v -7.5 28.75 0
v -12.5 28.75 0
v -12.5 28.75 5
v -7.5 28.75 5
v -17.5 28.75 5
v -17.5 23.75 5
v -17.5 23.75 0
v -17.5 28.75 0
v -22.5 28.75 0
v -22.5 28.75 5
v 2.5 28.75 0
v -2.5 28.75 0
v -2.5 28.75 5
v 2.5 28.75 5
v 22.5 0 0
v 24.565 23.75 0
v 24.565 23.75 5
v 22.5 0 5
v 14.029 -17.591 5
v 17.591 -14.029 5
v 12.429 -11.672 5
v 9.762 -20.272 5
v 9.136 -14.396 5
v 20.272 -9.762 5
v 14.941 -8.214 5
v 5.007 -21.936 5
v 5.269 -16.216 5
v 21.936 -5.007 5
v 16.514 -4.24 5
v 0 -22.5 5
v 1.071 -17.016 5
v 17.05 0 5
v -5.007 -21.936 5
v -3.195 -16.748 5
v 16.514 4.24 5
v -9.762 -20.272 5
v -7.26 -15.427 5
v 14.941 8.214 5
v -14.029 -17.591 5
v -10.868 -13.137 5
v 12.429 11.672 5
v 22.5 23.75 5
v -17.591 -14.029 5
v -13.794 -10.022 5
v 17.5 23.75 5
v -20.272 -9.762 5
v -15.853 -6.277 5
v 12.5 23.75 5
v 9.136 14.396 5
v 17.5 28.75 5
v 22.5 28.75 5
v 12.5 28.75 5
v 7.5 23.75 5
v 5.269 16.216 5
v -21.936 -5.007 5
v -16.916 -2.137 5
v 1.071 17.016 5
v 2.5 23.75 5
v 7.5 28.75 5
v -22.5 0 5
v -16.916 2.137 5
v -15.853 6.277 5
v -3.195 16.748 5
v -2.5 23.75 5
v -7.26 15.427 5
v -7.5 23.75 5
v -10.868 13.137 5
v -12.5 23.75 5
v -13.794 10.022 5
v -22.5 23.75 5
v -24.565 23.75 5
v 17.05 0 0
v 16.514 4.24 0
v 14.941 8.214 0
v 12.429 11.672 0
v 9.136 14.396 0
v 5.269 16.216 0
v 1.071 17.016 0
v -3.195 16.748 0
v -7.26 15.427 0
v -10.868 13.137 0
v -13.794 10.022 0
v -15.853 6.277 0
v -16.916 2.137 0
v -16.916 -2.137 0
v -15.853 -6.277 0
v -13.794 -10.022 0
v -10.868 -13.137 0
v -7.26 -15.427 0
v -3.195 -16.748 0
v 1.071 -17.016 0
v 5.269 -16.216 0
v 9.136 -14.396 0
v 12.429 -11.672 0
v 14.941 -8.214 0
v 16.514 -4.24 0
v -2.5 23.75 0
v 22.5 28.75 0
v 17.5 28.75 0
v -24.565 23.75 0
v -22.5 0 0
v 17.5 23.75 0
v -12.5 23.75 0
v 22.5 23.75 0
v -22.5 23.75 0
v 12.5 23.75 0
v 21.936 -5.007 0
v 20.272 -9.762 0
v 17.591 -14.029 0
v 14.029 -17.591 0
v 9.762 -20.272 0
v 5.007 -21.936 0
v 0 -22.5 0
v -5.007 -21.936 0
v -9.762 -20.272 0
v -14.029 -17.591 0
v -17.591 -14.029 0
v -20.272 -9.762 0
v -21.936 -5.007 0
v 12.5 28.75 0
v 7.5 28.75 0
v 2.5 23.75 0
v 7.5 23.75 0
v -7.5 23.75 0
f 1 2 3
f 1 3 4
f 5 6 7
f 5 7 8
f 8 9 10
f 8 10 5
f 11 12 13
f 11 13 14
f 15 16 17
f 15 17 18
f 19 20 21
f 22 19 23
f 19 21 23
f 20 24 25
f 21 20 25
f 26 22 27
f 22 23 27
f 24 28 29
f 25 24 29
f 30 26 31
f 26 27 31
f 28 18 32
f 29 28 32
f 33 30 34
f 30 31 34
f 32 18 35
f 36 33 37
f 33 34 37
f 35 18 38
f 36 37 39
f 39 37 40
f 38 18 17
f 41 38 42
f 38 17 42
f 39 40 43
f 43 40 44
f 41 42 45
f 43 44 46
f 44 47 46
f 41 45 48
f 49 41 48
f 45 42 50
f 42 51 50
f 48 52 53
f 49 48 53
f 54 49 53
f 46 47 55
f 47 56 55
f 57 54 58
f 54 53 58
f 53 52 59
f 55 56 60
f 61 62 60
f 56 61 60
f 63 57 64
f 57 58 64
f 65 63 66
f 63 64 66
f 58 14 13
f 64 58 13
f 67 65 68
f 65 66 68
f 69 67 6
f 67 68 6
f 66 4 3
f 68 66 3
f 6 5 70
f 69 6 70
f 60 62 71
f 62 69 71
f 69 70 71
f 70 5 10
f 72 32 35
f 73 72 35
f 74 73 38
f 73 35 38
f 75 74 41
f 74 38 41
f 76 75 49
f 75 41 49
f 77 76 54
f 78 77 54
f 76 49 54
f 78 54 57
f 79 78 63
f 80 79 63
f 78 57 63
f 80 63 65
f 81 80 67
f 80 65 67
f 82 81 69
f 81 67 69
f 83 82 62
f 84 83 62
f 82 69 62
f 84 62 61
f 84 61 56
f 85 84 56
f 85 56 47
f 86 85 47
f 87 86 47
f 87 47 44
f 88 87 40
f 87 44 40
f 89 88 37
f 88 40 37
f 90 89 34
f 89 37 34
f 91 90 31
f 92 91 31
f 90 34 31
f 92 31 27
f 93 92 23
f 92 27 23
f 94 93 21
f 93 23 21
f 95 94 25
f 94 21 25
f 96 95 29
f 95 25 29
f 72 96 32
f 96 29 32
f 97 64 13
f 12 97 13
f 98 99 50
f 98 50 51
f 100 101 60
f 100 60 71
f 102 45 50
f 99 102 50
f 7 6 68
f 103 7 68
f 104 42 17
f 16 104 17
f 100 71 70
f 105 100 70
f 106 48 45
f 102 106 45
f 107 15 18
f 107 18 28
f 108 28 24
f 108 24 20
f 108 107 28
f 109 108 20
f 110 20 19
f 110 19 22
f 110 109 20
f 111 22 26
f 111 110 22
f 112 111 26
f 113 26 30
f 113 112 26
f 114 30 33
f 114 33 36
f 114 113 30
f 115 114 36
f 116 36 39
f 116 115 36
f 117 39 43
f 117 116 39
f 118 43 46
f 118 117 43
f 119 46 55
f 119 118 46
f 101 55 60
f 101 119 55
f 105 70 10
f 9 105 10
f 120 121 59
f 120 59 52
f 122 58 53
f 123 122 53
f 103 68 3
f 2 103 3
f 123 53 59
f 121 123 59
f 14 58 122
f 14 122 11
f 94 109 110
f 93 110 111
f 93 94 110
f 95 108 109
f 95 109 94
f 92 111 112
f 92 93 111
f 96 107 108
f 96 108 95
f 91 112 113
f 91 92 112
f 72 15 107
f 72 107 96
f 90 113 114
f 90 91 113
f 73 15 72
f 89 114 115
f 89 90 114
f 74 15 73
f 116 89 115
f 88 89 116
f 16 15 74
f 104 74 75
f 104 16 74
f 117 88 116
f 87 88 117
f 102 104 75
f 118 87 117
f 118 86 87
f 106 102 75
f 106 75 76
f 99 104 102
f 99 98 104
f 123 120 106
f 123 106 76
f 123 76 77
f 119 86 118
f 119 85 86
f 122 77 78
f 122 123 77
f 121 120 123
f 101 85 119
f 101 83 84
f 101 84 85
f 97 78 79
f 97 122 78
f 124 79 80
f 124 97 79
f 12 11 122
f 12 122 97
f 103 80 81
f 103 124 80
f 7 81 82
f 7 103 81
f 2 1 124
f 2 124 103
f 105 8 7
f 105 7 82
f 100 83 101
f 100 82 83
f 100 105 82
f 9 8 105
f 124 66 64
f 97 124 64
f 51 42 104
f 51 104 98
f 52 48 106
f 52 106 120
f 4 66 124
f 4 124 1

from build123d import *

# Parameters (mm, degrees)
BOSS_EXTRU_12_DEPTH        = 5
ESQUISSE4_R                = 17.05
ENL_V_MAT_EXTRU_1_DEPTH    = 5
ESQUISSE5_W                = 5
ESQUISSE5_H                = 5
ENL_V_MAT_EXTRU_2_DEPTH    = 10
R_P_TITION_LIN_AIRE1_COUNT = 4
R_P_TITION_LIN_AIRE1_PITCH = 10
ESQUISSE6_W                = 13.329947017
ESQUISSE6_H                = 14.257676648
ESQUISSE6_W_2              = 10.080555657
ESQUISSE6_H_2              = 33.311834117
ENL_V_MAT_EXTRU_3_DEPTH    = 10


with BuildPart() as part:
    # Esquisse3 → Boss.-Extru.12 (new body)
    with BuildSketch(Plane.XY):
        with BuildLine():
            Line((-22.5, 0), (-25, 28.75))
            Line((-25, 28.75), (25, 28.75))
            Line((25, 28.75), (22.5, 0))
            ThreePointArc((22.5, 0), (0, -22.5), (-22.5, 0))
        make_face()
    extrude(amount=BOSS_EXTRU_12_DEPTH)

    # Esquisse4 → Enlèv. mat.-Extru.1 (cut)
    with BuildSketch(Plane.XY.offset(5)):
        Circle(ESQUISSE4_R)
    extrude(amount=-ENL_V_MAT_EXTRU_1_DEPTH, mode=Mode.SUBTRACT)

    # Esquisse5 → Enlèv. mat.-Extru.2 (cut)
    with BuildSketch(Plane.XY.offset(5)):
        with Locations((-15, 26.25)):
            Rectangle(ESQUISSE5_W, ESQUISSE5_H)
    enl_v_mat_extru_2 = extrude(amount=-ENL_V_MAT_EXTRU_2_DEPTH, mode=Mode.SUBTRACT)

    # Répétition linéaire1: Enlèv. mat.-Extru.2 ×4
    with Locations(*[(i * R_P_TITION_LIN_AIRE1_PITCH, 0, 0) for i in range(1, R_P_TITION_LIN_AIRE1_COUNT)]):
        add(enl_v_mat_extru_2, mode=Mode.SUBTRACT)

    # Esquisse6 → Enlèv. mat.-Extru.3 (cut)
    with BuildSketch(Plane.XY.offset(5)):
        with Locations((29.164973509, 30.878838324)):
            Rectangle(ESQUISSE6_W, ESQUISSE6_H)
        with Locations((-27.540277829, 40.405917059)):
            Rectangle(ESQUISSE6_W_2, ESQUISSE6_H_2)
    extrude(amount=-ENL_V_MAT_EXTRU_3_DEPTH, mode=Mode.SUBTRACT)


solid = part.part
